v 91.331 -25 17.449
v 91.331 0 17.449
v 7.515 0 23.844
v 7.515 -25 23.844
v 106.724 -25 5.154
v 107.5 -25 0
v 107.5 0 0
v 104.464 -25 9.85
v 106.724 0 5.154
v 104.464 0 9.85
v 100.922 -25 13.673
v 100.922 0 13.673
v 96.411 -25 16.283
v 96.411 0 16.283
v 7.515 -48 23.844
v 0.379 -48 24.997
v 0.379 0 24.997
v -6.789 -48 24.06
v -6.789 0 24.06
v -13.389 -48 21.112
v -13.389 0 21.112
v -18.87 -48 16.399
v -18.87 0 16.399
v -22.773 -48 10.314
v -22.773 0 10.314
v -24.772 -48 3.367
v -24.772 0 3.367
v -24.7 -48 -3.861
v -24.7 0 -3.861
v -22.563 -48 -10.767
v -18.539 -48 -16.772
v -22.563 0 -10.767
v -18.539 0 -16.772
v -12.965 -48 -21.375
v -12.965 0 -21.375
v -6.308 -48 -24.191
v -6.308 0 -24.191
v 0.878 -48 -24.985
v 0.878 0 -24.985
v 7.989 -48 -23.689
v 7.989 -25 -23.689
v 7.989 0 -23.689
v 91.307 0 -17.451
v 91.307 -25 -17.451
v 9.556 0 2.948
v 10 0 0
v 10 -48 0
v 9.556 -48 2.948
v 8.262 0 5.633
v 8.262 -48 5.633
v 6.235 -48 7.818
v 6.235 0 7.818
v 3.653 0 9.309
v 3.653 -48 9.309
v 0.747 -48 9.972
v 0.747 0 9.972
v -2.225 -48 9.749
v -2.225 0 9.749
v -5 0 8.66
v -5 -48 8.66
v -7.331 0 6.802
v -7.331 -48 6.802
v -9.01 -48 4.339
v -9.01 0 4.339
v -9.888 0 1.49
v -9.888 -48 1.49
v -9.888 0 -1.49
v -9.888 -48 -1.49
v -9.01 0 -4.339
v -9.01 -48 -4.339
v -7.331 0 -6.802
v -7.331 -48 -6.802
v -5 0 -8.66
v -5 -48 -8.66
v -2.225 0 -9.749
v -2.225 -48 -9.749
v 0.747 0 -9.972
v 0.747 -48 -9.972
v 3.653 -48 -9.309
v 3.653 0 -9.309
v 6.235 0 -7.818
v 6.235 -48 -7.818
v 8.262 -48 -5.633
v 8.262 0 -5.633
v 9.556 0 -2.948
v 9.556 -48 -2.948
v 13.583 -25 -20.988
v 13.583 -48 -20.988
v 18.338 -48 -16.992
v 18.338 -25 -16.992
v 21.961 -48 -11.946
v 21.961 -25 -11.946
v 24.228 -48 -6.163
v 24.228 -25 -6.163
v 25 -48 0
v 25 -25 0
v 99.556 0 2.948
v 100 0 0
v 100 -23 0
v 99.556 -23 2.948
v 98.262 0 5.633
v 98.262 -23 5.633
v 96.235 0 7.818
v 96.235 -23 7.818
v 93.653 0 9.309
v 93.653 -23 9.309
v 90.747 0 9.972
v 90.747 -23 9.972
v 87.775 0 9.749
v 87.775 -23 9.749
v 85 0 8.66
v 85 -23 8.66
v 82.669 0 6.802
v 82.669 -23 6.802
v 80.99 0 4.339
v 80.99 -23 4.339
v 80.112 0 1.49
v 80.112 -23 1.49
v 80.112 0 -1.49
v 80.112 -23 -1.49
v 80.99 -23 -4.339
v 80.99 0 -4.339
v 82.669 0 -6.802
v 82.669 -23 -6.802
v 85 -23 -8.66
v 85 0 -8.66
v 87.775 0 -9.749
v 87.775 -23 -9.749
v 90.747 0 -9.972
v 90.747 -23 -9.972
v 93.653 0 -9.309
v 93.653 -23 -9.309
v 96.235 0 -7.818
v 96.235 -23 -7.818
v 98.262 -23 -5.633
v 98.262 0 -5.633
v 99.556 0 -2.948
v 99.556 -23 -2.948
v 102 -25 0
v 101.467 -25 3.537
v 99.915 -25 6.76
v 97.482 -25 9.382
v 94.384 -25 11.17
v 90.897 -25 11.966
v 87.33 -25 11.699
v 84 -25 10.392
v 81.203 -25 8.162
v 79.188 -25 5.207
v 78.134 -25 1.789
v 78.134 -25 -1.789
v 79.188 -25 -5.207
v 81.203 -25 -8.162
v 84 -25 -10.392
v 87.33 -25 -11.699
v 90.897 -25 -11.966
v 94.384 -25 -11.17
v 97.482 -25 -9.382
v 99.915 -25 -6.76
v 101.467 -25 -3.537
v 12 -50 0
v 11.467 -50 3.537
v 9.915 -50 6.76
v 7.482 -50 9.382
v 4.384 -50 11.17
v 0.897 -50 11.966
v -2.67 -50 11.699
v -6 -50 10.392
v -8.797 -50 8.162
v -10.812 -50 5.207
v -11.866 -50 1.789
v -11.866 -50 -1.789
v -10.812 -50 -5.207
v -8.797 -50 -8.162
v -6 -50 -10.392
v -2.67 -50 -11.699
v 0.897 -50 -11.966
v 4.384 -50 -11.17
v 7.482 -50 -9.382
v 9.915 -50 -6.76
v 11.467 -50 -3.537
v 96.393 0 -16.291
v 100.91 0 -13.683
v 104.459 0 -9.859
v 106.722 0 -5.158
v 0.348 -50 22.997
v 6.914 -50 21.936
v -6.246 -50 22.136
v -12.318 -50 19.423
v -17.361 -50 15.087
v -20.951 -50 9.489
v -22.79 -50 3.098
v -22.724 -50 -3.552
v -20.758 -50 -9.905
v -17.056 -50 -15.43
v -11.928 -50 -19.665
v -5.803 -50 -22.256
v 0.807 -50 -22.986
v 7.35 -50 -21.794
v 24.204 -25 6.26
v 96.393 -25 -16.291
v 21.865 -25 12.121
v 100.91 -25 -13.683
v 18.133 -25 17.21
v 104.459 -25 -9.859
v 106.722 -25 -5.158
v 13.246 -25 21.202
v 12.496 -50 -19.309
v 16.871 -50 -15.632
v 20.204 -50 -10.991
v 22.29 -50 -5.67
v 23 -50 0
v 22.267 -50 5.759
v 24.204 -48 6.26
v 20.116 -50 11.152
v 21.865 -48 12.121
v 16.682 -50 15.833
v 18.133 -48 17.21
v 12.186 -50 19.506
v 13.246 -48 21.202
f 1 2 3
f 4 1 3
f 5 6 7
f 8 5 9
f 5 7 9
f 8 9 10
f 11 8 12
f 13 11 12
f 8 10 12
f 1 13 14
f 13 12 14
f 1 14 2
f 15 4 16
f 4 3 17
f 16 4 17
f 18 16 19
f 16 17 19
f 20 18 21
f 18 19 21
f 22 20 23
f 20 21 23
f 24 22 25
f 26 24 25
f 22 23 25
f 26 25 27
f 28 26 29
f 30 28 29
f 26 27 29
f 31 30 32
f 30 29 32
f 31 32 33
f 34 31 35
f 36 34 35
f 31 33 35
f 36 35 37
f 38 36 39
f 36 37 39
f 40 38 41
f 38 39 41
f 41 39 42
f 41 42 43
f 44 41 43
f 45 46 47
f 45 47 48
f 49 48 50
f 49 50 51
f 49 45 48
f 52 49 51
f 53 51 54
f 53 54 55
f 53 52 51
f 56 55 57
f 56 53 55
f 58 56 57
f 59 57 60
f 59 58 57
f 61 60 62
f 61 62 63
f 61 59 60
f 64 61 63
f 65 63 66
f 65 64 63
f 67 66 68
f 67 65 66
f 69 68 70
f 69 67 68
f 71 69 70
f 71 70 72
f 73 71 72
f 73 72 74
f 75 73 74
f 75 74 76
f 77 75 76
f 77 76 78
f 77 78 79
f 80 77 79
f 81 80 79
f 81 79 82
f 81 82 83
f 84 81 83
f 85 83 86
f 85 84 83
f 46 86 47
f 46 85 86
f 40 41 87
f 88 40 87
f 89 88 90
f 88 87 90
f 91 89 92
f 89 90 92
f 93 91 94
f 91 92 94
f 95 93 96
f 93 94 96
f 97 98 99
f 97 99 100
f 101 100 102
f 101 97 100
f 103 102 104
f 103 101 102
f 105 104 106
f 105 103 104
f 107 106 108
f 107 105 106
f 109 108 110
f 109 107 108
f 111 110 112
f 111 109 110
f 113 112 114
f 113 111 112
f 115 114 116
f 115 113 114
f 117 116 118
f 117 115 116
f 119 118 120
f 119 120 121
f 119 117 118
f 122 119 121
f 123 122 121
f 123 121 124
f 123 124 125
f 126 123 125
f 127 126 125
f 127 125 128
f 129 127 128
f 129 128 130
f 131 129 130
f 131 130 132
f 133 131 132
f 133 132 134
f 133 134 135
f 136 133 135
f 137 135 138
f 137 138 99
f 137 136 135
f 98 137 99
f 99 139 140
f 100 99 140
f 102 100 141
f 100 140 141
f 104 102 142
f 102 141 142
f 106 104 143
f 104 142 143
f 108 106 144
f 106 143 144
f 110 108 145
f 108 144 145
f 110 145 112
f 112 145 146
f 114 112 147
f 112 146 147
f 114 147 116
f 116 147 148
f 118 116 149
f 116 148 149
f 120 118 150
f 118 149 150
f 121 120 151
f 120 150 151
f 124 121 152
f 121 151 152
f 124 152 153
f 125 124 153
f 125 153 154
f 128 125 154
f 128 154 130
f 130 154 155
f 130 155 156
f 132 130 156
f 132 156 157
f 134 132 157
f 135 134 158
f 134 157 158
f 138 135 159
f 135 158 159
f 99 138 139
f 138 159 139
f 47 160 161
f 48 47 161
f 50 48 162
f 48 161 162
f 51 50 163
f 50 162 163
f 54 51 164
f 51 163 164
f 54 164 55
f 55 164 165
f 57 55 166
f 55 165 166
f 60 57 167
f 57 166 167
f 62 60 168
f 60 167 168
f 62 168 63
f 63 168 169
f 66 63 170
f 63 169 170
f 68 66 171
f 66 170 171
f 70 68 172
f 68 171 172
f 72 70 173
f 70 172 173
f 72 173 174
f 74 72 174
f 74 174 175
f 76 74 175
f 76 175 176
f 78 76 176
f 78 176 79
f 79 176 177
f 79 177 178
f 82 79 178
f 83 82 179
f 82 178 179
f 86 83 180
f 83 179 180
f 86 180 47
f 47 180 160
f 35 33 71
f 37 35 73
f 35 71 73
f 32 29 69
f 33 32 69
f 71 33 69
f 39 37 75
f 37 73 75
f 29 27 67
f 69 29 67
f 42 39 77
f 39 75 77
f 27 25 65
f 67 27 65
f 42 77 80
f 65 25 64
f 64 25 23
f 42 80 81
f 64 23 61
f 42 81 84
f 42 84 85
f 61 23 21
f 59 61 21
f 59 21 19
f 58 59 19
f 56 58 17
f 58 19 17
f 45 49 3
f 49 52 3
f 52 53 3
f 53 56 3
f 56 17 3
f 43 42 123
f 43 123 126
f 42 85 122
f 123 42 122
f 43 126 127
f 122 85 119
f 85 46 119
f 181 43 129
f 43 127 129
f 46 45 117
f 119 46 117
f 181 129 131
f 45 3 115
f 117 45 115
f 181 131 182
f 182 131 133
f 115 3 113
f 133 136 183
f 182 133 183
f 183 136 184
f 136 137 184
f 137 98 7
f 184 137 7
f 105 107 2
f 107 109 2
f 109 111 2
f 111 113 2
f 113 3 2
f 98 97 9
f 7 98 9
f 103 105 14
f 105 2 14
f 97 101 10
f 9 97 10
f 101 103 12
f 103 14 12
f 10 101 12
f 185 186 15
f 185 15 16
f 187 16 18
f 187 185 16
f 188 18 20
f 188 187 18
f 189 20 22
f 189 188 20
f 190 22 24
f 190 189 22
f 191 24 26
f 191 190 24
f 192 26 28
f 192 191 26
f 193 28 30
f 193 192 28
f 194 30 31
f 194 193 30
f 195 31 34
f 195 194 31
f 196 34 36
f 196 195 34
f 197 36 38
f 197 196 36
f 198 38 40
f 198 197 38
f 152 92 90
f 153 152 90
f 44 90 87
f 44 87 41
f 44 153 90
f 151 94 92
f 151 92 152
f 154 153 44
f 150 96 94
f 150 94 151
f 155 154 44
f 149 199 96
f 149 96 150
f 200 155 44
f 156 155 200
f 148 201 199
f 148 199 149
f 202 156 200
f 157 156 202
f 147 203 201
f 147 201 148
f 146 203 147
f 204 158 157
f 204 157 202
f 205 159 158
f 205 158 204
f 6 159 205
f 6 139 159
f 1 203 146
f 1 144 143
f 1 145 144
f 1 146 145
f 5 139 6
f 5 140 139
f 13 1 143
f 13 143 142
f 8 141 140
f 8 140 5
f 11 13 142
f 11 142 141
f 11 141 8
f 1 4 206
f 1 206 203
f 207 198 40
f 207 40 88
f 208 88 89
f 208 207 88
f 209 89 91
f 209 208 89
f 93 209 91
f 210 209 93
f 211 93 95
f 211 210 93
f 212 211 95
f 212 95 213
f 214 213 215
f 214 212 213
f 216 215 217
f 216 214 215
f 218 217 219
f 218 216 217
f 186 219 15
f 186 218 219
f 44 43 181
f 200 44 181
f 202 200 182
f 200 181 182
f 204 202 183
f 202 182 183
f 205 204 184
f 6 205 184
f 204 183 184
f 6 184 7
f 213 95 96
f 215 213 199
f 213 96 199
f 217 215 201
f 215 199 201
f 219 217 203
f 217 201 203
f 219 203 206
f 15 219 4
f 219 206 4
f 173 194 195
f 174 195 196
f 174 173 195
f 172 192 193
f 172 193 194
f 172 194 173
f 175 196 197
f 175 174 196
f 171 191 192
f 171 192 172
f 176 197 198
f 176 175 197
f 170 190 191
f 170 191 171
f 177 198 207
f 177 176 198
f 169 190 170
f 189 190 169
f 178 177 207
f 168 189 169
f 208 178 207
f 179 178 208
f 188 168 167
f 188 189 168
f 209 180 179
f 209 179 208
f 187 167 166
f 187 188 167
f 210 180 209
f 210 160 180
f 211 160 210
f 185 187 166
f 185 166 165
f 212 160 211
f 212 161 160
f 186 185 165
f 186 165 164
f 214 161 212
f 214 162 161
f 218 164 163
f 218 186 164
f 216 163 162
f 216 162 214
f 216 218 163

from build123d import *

# Parameters (mm, degrees)
F0_R     = 10
F1_DEPTH = 25
F2_DEPTH = 50
F3_SIZE  = 2


with BuildPart() as f1:
    # F0 (on Front) → F1 (new body)
    with BuildSketch(Plane.XZ):
        with BuildLine():
            ThreePointArc((7.989306, -23.689048), (20.306805, -14.581964), (25, 0))
            ThreePointArc((25, 0), (20.160232, 14.783946), (7.514795, 23.843822))
            ThreePointArc((7.514795, 23.843822), (-24.998754, -0.249557), (7.989306, -23.689048))
        make_face()
        Circle(F0_R, mode=Mode.SUBTRACT)
        with BuildLine():
            ThreePointArc((7.514795, 23.843822), (20.160232, 14.783946), (25, 0))
            ThreePointArc((25, 0), (20.306805, -14.581964), (7.989306, -23.689048))
            Line((7.989306, -23.689048), (91.306553, -17.451158))
            ThreePointArc((91.306553, -17.451158), (72.500004, 0.01238), (91.331243, 17.449292))
            Line((91.331243, 17.449292), (7.514795, 23.843822))
        make_face()
        with BuildLine():
            ThreePointArc((107.5, 0), (102.836408, 11.894395), (91.331243, 17.449292))
            ThreePointArc((91.331243, 17.449292), (72.500004, 0.01238), (91.306553, -17.451158))
            ThreePointArc((91.306553, -17.451158), (102.82799, -11.903473), (107.5, 0))
        make_face()
        with Locations((90, 0)):
            Circle(F0_R, mode=Mode.SUBTRACT)
    extrude(amount=F1_DEPTH)

    # F0 (on Front) → F2 (join)
    with BuildSketch(Plane.XZ):
        with BuildLine():
            ThreePointArc((7.989306, -23.689048), (20.306805, -14.581964), (25, 0))
            ThreePointArc((25, 0), (20.160232, 14.783946), (7.514795, 23.843822))
            ThreePointArc((7.514795, 23.843822), (-24.998754, -0.249557), (7.989306, -23.689048))
        make_face()
        Circle(F0_R, mode=Mode.SUBTRACT)
    extrude(amount=F2_DEPTH)

    # F3
    f3_edges = [f1.edges().sort_by_distance(p)[0] for p in [
        (-7.989306, -50, 23.689048),
        (-10, -50, 0),
        (80, -25, 0),
    ]]
    chamfer(f3_edges, length=F3_SIZE)


solid = f1.part
